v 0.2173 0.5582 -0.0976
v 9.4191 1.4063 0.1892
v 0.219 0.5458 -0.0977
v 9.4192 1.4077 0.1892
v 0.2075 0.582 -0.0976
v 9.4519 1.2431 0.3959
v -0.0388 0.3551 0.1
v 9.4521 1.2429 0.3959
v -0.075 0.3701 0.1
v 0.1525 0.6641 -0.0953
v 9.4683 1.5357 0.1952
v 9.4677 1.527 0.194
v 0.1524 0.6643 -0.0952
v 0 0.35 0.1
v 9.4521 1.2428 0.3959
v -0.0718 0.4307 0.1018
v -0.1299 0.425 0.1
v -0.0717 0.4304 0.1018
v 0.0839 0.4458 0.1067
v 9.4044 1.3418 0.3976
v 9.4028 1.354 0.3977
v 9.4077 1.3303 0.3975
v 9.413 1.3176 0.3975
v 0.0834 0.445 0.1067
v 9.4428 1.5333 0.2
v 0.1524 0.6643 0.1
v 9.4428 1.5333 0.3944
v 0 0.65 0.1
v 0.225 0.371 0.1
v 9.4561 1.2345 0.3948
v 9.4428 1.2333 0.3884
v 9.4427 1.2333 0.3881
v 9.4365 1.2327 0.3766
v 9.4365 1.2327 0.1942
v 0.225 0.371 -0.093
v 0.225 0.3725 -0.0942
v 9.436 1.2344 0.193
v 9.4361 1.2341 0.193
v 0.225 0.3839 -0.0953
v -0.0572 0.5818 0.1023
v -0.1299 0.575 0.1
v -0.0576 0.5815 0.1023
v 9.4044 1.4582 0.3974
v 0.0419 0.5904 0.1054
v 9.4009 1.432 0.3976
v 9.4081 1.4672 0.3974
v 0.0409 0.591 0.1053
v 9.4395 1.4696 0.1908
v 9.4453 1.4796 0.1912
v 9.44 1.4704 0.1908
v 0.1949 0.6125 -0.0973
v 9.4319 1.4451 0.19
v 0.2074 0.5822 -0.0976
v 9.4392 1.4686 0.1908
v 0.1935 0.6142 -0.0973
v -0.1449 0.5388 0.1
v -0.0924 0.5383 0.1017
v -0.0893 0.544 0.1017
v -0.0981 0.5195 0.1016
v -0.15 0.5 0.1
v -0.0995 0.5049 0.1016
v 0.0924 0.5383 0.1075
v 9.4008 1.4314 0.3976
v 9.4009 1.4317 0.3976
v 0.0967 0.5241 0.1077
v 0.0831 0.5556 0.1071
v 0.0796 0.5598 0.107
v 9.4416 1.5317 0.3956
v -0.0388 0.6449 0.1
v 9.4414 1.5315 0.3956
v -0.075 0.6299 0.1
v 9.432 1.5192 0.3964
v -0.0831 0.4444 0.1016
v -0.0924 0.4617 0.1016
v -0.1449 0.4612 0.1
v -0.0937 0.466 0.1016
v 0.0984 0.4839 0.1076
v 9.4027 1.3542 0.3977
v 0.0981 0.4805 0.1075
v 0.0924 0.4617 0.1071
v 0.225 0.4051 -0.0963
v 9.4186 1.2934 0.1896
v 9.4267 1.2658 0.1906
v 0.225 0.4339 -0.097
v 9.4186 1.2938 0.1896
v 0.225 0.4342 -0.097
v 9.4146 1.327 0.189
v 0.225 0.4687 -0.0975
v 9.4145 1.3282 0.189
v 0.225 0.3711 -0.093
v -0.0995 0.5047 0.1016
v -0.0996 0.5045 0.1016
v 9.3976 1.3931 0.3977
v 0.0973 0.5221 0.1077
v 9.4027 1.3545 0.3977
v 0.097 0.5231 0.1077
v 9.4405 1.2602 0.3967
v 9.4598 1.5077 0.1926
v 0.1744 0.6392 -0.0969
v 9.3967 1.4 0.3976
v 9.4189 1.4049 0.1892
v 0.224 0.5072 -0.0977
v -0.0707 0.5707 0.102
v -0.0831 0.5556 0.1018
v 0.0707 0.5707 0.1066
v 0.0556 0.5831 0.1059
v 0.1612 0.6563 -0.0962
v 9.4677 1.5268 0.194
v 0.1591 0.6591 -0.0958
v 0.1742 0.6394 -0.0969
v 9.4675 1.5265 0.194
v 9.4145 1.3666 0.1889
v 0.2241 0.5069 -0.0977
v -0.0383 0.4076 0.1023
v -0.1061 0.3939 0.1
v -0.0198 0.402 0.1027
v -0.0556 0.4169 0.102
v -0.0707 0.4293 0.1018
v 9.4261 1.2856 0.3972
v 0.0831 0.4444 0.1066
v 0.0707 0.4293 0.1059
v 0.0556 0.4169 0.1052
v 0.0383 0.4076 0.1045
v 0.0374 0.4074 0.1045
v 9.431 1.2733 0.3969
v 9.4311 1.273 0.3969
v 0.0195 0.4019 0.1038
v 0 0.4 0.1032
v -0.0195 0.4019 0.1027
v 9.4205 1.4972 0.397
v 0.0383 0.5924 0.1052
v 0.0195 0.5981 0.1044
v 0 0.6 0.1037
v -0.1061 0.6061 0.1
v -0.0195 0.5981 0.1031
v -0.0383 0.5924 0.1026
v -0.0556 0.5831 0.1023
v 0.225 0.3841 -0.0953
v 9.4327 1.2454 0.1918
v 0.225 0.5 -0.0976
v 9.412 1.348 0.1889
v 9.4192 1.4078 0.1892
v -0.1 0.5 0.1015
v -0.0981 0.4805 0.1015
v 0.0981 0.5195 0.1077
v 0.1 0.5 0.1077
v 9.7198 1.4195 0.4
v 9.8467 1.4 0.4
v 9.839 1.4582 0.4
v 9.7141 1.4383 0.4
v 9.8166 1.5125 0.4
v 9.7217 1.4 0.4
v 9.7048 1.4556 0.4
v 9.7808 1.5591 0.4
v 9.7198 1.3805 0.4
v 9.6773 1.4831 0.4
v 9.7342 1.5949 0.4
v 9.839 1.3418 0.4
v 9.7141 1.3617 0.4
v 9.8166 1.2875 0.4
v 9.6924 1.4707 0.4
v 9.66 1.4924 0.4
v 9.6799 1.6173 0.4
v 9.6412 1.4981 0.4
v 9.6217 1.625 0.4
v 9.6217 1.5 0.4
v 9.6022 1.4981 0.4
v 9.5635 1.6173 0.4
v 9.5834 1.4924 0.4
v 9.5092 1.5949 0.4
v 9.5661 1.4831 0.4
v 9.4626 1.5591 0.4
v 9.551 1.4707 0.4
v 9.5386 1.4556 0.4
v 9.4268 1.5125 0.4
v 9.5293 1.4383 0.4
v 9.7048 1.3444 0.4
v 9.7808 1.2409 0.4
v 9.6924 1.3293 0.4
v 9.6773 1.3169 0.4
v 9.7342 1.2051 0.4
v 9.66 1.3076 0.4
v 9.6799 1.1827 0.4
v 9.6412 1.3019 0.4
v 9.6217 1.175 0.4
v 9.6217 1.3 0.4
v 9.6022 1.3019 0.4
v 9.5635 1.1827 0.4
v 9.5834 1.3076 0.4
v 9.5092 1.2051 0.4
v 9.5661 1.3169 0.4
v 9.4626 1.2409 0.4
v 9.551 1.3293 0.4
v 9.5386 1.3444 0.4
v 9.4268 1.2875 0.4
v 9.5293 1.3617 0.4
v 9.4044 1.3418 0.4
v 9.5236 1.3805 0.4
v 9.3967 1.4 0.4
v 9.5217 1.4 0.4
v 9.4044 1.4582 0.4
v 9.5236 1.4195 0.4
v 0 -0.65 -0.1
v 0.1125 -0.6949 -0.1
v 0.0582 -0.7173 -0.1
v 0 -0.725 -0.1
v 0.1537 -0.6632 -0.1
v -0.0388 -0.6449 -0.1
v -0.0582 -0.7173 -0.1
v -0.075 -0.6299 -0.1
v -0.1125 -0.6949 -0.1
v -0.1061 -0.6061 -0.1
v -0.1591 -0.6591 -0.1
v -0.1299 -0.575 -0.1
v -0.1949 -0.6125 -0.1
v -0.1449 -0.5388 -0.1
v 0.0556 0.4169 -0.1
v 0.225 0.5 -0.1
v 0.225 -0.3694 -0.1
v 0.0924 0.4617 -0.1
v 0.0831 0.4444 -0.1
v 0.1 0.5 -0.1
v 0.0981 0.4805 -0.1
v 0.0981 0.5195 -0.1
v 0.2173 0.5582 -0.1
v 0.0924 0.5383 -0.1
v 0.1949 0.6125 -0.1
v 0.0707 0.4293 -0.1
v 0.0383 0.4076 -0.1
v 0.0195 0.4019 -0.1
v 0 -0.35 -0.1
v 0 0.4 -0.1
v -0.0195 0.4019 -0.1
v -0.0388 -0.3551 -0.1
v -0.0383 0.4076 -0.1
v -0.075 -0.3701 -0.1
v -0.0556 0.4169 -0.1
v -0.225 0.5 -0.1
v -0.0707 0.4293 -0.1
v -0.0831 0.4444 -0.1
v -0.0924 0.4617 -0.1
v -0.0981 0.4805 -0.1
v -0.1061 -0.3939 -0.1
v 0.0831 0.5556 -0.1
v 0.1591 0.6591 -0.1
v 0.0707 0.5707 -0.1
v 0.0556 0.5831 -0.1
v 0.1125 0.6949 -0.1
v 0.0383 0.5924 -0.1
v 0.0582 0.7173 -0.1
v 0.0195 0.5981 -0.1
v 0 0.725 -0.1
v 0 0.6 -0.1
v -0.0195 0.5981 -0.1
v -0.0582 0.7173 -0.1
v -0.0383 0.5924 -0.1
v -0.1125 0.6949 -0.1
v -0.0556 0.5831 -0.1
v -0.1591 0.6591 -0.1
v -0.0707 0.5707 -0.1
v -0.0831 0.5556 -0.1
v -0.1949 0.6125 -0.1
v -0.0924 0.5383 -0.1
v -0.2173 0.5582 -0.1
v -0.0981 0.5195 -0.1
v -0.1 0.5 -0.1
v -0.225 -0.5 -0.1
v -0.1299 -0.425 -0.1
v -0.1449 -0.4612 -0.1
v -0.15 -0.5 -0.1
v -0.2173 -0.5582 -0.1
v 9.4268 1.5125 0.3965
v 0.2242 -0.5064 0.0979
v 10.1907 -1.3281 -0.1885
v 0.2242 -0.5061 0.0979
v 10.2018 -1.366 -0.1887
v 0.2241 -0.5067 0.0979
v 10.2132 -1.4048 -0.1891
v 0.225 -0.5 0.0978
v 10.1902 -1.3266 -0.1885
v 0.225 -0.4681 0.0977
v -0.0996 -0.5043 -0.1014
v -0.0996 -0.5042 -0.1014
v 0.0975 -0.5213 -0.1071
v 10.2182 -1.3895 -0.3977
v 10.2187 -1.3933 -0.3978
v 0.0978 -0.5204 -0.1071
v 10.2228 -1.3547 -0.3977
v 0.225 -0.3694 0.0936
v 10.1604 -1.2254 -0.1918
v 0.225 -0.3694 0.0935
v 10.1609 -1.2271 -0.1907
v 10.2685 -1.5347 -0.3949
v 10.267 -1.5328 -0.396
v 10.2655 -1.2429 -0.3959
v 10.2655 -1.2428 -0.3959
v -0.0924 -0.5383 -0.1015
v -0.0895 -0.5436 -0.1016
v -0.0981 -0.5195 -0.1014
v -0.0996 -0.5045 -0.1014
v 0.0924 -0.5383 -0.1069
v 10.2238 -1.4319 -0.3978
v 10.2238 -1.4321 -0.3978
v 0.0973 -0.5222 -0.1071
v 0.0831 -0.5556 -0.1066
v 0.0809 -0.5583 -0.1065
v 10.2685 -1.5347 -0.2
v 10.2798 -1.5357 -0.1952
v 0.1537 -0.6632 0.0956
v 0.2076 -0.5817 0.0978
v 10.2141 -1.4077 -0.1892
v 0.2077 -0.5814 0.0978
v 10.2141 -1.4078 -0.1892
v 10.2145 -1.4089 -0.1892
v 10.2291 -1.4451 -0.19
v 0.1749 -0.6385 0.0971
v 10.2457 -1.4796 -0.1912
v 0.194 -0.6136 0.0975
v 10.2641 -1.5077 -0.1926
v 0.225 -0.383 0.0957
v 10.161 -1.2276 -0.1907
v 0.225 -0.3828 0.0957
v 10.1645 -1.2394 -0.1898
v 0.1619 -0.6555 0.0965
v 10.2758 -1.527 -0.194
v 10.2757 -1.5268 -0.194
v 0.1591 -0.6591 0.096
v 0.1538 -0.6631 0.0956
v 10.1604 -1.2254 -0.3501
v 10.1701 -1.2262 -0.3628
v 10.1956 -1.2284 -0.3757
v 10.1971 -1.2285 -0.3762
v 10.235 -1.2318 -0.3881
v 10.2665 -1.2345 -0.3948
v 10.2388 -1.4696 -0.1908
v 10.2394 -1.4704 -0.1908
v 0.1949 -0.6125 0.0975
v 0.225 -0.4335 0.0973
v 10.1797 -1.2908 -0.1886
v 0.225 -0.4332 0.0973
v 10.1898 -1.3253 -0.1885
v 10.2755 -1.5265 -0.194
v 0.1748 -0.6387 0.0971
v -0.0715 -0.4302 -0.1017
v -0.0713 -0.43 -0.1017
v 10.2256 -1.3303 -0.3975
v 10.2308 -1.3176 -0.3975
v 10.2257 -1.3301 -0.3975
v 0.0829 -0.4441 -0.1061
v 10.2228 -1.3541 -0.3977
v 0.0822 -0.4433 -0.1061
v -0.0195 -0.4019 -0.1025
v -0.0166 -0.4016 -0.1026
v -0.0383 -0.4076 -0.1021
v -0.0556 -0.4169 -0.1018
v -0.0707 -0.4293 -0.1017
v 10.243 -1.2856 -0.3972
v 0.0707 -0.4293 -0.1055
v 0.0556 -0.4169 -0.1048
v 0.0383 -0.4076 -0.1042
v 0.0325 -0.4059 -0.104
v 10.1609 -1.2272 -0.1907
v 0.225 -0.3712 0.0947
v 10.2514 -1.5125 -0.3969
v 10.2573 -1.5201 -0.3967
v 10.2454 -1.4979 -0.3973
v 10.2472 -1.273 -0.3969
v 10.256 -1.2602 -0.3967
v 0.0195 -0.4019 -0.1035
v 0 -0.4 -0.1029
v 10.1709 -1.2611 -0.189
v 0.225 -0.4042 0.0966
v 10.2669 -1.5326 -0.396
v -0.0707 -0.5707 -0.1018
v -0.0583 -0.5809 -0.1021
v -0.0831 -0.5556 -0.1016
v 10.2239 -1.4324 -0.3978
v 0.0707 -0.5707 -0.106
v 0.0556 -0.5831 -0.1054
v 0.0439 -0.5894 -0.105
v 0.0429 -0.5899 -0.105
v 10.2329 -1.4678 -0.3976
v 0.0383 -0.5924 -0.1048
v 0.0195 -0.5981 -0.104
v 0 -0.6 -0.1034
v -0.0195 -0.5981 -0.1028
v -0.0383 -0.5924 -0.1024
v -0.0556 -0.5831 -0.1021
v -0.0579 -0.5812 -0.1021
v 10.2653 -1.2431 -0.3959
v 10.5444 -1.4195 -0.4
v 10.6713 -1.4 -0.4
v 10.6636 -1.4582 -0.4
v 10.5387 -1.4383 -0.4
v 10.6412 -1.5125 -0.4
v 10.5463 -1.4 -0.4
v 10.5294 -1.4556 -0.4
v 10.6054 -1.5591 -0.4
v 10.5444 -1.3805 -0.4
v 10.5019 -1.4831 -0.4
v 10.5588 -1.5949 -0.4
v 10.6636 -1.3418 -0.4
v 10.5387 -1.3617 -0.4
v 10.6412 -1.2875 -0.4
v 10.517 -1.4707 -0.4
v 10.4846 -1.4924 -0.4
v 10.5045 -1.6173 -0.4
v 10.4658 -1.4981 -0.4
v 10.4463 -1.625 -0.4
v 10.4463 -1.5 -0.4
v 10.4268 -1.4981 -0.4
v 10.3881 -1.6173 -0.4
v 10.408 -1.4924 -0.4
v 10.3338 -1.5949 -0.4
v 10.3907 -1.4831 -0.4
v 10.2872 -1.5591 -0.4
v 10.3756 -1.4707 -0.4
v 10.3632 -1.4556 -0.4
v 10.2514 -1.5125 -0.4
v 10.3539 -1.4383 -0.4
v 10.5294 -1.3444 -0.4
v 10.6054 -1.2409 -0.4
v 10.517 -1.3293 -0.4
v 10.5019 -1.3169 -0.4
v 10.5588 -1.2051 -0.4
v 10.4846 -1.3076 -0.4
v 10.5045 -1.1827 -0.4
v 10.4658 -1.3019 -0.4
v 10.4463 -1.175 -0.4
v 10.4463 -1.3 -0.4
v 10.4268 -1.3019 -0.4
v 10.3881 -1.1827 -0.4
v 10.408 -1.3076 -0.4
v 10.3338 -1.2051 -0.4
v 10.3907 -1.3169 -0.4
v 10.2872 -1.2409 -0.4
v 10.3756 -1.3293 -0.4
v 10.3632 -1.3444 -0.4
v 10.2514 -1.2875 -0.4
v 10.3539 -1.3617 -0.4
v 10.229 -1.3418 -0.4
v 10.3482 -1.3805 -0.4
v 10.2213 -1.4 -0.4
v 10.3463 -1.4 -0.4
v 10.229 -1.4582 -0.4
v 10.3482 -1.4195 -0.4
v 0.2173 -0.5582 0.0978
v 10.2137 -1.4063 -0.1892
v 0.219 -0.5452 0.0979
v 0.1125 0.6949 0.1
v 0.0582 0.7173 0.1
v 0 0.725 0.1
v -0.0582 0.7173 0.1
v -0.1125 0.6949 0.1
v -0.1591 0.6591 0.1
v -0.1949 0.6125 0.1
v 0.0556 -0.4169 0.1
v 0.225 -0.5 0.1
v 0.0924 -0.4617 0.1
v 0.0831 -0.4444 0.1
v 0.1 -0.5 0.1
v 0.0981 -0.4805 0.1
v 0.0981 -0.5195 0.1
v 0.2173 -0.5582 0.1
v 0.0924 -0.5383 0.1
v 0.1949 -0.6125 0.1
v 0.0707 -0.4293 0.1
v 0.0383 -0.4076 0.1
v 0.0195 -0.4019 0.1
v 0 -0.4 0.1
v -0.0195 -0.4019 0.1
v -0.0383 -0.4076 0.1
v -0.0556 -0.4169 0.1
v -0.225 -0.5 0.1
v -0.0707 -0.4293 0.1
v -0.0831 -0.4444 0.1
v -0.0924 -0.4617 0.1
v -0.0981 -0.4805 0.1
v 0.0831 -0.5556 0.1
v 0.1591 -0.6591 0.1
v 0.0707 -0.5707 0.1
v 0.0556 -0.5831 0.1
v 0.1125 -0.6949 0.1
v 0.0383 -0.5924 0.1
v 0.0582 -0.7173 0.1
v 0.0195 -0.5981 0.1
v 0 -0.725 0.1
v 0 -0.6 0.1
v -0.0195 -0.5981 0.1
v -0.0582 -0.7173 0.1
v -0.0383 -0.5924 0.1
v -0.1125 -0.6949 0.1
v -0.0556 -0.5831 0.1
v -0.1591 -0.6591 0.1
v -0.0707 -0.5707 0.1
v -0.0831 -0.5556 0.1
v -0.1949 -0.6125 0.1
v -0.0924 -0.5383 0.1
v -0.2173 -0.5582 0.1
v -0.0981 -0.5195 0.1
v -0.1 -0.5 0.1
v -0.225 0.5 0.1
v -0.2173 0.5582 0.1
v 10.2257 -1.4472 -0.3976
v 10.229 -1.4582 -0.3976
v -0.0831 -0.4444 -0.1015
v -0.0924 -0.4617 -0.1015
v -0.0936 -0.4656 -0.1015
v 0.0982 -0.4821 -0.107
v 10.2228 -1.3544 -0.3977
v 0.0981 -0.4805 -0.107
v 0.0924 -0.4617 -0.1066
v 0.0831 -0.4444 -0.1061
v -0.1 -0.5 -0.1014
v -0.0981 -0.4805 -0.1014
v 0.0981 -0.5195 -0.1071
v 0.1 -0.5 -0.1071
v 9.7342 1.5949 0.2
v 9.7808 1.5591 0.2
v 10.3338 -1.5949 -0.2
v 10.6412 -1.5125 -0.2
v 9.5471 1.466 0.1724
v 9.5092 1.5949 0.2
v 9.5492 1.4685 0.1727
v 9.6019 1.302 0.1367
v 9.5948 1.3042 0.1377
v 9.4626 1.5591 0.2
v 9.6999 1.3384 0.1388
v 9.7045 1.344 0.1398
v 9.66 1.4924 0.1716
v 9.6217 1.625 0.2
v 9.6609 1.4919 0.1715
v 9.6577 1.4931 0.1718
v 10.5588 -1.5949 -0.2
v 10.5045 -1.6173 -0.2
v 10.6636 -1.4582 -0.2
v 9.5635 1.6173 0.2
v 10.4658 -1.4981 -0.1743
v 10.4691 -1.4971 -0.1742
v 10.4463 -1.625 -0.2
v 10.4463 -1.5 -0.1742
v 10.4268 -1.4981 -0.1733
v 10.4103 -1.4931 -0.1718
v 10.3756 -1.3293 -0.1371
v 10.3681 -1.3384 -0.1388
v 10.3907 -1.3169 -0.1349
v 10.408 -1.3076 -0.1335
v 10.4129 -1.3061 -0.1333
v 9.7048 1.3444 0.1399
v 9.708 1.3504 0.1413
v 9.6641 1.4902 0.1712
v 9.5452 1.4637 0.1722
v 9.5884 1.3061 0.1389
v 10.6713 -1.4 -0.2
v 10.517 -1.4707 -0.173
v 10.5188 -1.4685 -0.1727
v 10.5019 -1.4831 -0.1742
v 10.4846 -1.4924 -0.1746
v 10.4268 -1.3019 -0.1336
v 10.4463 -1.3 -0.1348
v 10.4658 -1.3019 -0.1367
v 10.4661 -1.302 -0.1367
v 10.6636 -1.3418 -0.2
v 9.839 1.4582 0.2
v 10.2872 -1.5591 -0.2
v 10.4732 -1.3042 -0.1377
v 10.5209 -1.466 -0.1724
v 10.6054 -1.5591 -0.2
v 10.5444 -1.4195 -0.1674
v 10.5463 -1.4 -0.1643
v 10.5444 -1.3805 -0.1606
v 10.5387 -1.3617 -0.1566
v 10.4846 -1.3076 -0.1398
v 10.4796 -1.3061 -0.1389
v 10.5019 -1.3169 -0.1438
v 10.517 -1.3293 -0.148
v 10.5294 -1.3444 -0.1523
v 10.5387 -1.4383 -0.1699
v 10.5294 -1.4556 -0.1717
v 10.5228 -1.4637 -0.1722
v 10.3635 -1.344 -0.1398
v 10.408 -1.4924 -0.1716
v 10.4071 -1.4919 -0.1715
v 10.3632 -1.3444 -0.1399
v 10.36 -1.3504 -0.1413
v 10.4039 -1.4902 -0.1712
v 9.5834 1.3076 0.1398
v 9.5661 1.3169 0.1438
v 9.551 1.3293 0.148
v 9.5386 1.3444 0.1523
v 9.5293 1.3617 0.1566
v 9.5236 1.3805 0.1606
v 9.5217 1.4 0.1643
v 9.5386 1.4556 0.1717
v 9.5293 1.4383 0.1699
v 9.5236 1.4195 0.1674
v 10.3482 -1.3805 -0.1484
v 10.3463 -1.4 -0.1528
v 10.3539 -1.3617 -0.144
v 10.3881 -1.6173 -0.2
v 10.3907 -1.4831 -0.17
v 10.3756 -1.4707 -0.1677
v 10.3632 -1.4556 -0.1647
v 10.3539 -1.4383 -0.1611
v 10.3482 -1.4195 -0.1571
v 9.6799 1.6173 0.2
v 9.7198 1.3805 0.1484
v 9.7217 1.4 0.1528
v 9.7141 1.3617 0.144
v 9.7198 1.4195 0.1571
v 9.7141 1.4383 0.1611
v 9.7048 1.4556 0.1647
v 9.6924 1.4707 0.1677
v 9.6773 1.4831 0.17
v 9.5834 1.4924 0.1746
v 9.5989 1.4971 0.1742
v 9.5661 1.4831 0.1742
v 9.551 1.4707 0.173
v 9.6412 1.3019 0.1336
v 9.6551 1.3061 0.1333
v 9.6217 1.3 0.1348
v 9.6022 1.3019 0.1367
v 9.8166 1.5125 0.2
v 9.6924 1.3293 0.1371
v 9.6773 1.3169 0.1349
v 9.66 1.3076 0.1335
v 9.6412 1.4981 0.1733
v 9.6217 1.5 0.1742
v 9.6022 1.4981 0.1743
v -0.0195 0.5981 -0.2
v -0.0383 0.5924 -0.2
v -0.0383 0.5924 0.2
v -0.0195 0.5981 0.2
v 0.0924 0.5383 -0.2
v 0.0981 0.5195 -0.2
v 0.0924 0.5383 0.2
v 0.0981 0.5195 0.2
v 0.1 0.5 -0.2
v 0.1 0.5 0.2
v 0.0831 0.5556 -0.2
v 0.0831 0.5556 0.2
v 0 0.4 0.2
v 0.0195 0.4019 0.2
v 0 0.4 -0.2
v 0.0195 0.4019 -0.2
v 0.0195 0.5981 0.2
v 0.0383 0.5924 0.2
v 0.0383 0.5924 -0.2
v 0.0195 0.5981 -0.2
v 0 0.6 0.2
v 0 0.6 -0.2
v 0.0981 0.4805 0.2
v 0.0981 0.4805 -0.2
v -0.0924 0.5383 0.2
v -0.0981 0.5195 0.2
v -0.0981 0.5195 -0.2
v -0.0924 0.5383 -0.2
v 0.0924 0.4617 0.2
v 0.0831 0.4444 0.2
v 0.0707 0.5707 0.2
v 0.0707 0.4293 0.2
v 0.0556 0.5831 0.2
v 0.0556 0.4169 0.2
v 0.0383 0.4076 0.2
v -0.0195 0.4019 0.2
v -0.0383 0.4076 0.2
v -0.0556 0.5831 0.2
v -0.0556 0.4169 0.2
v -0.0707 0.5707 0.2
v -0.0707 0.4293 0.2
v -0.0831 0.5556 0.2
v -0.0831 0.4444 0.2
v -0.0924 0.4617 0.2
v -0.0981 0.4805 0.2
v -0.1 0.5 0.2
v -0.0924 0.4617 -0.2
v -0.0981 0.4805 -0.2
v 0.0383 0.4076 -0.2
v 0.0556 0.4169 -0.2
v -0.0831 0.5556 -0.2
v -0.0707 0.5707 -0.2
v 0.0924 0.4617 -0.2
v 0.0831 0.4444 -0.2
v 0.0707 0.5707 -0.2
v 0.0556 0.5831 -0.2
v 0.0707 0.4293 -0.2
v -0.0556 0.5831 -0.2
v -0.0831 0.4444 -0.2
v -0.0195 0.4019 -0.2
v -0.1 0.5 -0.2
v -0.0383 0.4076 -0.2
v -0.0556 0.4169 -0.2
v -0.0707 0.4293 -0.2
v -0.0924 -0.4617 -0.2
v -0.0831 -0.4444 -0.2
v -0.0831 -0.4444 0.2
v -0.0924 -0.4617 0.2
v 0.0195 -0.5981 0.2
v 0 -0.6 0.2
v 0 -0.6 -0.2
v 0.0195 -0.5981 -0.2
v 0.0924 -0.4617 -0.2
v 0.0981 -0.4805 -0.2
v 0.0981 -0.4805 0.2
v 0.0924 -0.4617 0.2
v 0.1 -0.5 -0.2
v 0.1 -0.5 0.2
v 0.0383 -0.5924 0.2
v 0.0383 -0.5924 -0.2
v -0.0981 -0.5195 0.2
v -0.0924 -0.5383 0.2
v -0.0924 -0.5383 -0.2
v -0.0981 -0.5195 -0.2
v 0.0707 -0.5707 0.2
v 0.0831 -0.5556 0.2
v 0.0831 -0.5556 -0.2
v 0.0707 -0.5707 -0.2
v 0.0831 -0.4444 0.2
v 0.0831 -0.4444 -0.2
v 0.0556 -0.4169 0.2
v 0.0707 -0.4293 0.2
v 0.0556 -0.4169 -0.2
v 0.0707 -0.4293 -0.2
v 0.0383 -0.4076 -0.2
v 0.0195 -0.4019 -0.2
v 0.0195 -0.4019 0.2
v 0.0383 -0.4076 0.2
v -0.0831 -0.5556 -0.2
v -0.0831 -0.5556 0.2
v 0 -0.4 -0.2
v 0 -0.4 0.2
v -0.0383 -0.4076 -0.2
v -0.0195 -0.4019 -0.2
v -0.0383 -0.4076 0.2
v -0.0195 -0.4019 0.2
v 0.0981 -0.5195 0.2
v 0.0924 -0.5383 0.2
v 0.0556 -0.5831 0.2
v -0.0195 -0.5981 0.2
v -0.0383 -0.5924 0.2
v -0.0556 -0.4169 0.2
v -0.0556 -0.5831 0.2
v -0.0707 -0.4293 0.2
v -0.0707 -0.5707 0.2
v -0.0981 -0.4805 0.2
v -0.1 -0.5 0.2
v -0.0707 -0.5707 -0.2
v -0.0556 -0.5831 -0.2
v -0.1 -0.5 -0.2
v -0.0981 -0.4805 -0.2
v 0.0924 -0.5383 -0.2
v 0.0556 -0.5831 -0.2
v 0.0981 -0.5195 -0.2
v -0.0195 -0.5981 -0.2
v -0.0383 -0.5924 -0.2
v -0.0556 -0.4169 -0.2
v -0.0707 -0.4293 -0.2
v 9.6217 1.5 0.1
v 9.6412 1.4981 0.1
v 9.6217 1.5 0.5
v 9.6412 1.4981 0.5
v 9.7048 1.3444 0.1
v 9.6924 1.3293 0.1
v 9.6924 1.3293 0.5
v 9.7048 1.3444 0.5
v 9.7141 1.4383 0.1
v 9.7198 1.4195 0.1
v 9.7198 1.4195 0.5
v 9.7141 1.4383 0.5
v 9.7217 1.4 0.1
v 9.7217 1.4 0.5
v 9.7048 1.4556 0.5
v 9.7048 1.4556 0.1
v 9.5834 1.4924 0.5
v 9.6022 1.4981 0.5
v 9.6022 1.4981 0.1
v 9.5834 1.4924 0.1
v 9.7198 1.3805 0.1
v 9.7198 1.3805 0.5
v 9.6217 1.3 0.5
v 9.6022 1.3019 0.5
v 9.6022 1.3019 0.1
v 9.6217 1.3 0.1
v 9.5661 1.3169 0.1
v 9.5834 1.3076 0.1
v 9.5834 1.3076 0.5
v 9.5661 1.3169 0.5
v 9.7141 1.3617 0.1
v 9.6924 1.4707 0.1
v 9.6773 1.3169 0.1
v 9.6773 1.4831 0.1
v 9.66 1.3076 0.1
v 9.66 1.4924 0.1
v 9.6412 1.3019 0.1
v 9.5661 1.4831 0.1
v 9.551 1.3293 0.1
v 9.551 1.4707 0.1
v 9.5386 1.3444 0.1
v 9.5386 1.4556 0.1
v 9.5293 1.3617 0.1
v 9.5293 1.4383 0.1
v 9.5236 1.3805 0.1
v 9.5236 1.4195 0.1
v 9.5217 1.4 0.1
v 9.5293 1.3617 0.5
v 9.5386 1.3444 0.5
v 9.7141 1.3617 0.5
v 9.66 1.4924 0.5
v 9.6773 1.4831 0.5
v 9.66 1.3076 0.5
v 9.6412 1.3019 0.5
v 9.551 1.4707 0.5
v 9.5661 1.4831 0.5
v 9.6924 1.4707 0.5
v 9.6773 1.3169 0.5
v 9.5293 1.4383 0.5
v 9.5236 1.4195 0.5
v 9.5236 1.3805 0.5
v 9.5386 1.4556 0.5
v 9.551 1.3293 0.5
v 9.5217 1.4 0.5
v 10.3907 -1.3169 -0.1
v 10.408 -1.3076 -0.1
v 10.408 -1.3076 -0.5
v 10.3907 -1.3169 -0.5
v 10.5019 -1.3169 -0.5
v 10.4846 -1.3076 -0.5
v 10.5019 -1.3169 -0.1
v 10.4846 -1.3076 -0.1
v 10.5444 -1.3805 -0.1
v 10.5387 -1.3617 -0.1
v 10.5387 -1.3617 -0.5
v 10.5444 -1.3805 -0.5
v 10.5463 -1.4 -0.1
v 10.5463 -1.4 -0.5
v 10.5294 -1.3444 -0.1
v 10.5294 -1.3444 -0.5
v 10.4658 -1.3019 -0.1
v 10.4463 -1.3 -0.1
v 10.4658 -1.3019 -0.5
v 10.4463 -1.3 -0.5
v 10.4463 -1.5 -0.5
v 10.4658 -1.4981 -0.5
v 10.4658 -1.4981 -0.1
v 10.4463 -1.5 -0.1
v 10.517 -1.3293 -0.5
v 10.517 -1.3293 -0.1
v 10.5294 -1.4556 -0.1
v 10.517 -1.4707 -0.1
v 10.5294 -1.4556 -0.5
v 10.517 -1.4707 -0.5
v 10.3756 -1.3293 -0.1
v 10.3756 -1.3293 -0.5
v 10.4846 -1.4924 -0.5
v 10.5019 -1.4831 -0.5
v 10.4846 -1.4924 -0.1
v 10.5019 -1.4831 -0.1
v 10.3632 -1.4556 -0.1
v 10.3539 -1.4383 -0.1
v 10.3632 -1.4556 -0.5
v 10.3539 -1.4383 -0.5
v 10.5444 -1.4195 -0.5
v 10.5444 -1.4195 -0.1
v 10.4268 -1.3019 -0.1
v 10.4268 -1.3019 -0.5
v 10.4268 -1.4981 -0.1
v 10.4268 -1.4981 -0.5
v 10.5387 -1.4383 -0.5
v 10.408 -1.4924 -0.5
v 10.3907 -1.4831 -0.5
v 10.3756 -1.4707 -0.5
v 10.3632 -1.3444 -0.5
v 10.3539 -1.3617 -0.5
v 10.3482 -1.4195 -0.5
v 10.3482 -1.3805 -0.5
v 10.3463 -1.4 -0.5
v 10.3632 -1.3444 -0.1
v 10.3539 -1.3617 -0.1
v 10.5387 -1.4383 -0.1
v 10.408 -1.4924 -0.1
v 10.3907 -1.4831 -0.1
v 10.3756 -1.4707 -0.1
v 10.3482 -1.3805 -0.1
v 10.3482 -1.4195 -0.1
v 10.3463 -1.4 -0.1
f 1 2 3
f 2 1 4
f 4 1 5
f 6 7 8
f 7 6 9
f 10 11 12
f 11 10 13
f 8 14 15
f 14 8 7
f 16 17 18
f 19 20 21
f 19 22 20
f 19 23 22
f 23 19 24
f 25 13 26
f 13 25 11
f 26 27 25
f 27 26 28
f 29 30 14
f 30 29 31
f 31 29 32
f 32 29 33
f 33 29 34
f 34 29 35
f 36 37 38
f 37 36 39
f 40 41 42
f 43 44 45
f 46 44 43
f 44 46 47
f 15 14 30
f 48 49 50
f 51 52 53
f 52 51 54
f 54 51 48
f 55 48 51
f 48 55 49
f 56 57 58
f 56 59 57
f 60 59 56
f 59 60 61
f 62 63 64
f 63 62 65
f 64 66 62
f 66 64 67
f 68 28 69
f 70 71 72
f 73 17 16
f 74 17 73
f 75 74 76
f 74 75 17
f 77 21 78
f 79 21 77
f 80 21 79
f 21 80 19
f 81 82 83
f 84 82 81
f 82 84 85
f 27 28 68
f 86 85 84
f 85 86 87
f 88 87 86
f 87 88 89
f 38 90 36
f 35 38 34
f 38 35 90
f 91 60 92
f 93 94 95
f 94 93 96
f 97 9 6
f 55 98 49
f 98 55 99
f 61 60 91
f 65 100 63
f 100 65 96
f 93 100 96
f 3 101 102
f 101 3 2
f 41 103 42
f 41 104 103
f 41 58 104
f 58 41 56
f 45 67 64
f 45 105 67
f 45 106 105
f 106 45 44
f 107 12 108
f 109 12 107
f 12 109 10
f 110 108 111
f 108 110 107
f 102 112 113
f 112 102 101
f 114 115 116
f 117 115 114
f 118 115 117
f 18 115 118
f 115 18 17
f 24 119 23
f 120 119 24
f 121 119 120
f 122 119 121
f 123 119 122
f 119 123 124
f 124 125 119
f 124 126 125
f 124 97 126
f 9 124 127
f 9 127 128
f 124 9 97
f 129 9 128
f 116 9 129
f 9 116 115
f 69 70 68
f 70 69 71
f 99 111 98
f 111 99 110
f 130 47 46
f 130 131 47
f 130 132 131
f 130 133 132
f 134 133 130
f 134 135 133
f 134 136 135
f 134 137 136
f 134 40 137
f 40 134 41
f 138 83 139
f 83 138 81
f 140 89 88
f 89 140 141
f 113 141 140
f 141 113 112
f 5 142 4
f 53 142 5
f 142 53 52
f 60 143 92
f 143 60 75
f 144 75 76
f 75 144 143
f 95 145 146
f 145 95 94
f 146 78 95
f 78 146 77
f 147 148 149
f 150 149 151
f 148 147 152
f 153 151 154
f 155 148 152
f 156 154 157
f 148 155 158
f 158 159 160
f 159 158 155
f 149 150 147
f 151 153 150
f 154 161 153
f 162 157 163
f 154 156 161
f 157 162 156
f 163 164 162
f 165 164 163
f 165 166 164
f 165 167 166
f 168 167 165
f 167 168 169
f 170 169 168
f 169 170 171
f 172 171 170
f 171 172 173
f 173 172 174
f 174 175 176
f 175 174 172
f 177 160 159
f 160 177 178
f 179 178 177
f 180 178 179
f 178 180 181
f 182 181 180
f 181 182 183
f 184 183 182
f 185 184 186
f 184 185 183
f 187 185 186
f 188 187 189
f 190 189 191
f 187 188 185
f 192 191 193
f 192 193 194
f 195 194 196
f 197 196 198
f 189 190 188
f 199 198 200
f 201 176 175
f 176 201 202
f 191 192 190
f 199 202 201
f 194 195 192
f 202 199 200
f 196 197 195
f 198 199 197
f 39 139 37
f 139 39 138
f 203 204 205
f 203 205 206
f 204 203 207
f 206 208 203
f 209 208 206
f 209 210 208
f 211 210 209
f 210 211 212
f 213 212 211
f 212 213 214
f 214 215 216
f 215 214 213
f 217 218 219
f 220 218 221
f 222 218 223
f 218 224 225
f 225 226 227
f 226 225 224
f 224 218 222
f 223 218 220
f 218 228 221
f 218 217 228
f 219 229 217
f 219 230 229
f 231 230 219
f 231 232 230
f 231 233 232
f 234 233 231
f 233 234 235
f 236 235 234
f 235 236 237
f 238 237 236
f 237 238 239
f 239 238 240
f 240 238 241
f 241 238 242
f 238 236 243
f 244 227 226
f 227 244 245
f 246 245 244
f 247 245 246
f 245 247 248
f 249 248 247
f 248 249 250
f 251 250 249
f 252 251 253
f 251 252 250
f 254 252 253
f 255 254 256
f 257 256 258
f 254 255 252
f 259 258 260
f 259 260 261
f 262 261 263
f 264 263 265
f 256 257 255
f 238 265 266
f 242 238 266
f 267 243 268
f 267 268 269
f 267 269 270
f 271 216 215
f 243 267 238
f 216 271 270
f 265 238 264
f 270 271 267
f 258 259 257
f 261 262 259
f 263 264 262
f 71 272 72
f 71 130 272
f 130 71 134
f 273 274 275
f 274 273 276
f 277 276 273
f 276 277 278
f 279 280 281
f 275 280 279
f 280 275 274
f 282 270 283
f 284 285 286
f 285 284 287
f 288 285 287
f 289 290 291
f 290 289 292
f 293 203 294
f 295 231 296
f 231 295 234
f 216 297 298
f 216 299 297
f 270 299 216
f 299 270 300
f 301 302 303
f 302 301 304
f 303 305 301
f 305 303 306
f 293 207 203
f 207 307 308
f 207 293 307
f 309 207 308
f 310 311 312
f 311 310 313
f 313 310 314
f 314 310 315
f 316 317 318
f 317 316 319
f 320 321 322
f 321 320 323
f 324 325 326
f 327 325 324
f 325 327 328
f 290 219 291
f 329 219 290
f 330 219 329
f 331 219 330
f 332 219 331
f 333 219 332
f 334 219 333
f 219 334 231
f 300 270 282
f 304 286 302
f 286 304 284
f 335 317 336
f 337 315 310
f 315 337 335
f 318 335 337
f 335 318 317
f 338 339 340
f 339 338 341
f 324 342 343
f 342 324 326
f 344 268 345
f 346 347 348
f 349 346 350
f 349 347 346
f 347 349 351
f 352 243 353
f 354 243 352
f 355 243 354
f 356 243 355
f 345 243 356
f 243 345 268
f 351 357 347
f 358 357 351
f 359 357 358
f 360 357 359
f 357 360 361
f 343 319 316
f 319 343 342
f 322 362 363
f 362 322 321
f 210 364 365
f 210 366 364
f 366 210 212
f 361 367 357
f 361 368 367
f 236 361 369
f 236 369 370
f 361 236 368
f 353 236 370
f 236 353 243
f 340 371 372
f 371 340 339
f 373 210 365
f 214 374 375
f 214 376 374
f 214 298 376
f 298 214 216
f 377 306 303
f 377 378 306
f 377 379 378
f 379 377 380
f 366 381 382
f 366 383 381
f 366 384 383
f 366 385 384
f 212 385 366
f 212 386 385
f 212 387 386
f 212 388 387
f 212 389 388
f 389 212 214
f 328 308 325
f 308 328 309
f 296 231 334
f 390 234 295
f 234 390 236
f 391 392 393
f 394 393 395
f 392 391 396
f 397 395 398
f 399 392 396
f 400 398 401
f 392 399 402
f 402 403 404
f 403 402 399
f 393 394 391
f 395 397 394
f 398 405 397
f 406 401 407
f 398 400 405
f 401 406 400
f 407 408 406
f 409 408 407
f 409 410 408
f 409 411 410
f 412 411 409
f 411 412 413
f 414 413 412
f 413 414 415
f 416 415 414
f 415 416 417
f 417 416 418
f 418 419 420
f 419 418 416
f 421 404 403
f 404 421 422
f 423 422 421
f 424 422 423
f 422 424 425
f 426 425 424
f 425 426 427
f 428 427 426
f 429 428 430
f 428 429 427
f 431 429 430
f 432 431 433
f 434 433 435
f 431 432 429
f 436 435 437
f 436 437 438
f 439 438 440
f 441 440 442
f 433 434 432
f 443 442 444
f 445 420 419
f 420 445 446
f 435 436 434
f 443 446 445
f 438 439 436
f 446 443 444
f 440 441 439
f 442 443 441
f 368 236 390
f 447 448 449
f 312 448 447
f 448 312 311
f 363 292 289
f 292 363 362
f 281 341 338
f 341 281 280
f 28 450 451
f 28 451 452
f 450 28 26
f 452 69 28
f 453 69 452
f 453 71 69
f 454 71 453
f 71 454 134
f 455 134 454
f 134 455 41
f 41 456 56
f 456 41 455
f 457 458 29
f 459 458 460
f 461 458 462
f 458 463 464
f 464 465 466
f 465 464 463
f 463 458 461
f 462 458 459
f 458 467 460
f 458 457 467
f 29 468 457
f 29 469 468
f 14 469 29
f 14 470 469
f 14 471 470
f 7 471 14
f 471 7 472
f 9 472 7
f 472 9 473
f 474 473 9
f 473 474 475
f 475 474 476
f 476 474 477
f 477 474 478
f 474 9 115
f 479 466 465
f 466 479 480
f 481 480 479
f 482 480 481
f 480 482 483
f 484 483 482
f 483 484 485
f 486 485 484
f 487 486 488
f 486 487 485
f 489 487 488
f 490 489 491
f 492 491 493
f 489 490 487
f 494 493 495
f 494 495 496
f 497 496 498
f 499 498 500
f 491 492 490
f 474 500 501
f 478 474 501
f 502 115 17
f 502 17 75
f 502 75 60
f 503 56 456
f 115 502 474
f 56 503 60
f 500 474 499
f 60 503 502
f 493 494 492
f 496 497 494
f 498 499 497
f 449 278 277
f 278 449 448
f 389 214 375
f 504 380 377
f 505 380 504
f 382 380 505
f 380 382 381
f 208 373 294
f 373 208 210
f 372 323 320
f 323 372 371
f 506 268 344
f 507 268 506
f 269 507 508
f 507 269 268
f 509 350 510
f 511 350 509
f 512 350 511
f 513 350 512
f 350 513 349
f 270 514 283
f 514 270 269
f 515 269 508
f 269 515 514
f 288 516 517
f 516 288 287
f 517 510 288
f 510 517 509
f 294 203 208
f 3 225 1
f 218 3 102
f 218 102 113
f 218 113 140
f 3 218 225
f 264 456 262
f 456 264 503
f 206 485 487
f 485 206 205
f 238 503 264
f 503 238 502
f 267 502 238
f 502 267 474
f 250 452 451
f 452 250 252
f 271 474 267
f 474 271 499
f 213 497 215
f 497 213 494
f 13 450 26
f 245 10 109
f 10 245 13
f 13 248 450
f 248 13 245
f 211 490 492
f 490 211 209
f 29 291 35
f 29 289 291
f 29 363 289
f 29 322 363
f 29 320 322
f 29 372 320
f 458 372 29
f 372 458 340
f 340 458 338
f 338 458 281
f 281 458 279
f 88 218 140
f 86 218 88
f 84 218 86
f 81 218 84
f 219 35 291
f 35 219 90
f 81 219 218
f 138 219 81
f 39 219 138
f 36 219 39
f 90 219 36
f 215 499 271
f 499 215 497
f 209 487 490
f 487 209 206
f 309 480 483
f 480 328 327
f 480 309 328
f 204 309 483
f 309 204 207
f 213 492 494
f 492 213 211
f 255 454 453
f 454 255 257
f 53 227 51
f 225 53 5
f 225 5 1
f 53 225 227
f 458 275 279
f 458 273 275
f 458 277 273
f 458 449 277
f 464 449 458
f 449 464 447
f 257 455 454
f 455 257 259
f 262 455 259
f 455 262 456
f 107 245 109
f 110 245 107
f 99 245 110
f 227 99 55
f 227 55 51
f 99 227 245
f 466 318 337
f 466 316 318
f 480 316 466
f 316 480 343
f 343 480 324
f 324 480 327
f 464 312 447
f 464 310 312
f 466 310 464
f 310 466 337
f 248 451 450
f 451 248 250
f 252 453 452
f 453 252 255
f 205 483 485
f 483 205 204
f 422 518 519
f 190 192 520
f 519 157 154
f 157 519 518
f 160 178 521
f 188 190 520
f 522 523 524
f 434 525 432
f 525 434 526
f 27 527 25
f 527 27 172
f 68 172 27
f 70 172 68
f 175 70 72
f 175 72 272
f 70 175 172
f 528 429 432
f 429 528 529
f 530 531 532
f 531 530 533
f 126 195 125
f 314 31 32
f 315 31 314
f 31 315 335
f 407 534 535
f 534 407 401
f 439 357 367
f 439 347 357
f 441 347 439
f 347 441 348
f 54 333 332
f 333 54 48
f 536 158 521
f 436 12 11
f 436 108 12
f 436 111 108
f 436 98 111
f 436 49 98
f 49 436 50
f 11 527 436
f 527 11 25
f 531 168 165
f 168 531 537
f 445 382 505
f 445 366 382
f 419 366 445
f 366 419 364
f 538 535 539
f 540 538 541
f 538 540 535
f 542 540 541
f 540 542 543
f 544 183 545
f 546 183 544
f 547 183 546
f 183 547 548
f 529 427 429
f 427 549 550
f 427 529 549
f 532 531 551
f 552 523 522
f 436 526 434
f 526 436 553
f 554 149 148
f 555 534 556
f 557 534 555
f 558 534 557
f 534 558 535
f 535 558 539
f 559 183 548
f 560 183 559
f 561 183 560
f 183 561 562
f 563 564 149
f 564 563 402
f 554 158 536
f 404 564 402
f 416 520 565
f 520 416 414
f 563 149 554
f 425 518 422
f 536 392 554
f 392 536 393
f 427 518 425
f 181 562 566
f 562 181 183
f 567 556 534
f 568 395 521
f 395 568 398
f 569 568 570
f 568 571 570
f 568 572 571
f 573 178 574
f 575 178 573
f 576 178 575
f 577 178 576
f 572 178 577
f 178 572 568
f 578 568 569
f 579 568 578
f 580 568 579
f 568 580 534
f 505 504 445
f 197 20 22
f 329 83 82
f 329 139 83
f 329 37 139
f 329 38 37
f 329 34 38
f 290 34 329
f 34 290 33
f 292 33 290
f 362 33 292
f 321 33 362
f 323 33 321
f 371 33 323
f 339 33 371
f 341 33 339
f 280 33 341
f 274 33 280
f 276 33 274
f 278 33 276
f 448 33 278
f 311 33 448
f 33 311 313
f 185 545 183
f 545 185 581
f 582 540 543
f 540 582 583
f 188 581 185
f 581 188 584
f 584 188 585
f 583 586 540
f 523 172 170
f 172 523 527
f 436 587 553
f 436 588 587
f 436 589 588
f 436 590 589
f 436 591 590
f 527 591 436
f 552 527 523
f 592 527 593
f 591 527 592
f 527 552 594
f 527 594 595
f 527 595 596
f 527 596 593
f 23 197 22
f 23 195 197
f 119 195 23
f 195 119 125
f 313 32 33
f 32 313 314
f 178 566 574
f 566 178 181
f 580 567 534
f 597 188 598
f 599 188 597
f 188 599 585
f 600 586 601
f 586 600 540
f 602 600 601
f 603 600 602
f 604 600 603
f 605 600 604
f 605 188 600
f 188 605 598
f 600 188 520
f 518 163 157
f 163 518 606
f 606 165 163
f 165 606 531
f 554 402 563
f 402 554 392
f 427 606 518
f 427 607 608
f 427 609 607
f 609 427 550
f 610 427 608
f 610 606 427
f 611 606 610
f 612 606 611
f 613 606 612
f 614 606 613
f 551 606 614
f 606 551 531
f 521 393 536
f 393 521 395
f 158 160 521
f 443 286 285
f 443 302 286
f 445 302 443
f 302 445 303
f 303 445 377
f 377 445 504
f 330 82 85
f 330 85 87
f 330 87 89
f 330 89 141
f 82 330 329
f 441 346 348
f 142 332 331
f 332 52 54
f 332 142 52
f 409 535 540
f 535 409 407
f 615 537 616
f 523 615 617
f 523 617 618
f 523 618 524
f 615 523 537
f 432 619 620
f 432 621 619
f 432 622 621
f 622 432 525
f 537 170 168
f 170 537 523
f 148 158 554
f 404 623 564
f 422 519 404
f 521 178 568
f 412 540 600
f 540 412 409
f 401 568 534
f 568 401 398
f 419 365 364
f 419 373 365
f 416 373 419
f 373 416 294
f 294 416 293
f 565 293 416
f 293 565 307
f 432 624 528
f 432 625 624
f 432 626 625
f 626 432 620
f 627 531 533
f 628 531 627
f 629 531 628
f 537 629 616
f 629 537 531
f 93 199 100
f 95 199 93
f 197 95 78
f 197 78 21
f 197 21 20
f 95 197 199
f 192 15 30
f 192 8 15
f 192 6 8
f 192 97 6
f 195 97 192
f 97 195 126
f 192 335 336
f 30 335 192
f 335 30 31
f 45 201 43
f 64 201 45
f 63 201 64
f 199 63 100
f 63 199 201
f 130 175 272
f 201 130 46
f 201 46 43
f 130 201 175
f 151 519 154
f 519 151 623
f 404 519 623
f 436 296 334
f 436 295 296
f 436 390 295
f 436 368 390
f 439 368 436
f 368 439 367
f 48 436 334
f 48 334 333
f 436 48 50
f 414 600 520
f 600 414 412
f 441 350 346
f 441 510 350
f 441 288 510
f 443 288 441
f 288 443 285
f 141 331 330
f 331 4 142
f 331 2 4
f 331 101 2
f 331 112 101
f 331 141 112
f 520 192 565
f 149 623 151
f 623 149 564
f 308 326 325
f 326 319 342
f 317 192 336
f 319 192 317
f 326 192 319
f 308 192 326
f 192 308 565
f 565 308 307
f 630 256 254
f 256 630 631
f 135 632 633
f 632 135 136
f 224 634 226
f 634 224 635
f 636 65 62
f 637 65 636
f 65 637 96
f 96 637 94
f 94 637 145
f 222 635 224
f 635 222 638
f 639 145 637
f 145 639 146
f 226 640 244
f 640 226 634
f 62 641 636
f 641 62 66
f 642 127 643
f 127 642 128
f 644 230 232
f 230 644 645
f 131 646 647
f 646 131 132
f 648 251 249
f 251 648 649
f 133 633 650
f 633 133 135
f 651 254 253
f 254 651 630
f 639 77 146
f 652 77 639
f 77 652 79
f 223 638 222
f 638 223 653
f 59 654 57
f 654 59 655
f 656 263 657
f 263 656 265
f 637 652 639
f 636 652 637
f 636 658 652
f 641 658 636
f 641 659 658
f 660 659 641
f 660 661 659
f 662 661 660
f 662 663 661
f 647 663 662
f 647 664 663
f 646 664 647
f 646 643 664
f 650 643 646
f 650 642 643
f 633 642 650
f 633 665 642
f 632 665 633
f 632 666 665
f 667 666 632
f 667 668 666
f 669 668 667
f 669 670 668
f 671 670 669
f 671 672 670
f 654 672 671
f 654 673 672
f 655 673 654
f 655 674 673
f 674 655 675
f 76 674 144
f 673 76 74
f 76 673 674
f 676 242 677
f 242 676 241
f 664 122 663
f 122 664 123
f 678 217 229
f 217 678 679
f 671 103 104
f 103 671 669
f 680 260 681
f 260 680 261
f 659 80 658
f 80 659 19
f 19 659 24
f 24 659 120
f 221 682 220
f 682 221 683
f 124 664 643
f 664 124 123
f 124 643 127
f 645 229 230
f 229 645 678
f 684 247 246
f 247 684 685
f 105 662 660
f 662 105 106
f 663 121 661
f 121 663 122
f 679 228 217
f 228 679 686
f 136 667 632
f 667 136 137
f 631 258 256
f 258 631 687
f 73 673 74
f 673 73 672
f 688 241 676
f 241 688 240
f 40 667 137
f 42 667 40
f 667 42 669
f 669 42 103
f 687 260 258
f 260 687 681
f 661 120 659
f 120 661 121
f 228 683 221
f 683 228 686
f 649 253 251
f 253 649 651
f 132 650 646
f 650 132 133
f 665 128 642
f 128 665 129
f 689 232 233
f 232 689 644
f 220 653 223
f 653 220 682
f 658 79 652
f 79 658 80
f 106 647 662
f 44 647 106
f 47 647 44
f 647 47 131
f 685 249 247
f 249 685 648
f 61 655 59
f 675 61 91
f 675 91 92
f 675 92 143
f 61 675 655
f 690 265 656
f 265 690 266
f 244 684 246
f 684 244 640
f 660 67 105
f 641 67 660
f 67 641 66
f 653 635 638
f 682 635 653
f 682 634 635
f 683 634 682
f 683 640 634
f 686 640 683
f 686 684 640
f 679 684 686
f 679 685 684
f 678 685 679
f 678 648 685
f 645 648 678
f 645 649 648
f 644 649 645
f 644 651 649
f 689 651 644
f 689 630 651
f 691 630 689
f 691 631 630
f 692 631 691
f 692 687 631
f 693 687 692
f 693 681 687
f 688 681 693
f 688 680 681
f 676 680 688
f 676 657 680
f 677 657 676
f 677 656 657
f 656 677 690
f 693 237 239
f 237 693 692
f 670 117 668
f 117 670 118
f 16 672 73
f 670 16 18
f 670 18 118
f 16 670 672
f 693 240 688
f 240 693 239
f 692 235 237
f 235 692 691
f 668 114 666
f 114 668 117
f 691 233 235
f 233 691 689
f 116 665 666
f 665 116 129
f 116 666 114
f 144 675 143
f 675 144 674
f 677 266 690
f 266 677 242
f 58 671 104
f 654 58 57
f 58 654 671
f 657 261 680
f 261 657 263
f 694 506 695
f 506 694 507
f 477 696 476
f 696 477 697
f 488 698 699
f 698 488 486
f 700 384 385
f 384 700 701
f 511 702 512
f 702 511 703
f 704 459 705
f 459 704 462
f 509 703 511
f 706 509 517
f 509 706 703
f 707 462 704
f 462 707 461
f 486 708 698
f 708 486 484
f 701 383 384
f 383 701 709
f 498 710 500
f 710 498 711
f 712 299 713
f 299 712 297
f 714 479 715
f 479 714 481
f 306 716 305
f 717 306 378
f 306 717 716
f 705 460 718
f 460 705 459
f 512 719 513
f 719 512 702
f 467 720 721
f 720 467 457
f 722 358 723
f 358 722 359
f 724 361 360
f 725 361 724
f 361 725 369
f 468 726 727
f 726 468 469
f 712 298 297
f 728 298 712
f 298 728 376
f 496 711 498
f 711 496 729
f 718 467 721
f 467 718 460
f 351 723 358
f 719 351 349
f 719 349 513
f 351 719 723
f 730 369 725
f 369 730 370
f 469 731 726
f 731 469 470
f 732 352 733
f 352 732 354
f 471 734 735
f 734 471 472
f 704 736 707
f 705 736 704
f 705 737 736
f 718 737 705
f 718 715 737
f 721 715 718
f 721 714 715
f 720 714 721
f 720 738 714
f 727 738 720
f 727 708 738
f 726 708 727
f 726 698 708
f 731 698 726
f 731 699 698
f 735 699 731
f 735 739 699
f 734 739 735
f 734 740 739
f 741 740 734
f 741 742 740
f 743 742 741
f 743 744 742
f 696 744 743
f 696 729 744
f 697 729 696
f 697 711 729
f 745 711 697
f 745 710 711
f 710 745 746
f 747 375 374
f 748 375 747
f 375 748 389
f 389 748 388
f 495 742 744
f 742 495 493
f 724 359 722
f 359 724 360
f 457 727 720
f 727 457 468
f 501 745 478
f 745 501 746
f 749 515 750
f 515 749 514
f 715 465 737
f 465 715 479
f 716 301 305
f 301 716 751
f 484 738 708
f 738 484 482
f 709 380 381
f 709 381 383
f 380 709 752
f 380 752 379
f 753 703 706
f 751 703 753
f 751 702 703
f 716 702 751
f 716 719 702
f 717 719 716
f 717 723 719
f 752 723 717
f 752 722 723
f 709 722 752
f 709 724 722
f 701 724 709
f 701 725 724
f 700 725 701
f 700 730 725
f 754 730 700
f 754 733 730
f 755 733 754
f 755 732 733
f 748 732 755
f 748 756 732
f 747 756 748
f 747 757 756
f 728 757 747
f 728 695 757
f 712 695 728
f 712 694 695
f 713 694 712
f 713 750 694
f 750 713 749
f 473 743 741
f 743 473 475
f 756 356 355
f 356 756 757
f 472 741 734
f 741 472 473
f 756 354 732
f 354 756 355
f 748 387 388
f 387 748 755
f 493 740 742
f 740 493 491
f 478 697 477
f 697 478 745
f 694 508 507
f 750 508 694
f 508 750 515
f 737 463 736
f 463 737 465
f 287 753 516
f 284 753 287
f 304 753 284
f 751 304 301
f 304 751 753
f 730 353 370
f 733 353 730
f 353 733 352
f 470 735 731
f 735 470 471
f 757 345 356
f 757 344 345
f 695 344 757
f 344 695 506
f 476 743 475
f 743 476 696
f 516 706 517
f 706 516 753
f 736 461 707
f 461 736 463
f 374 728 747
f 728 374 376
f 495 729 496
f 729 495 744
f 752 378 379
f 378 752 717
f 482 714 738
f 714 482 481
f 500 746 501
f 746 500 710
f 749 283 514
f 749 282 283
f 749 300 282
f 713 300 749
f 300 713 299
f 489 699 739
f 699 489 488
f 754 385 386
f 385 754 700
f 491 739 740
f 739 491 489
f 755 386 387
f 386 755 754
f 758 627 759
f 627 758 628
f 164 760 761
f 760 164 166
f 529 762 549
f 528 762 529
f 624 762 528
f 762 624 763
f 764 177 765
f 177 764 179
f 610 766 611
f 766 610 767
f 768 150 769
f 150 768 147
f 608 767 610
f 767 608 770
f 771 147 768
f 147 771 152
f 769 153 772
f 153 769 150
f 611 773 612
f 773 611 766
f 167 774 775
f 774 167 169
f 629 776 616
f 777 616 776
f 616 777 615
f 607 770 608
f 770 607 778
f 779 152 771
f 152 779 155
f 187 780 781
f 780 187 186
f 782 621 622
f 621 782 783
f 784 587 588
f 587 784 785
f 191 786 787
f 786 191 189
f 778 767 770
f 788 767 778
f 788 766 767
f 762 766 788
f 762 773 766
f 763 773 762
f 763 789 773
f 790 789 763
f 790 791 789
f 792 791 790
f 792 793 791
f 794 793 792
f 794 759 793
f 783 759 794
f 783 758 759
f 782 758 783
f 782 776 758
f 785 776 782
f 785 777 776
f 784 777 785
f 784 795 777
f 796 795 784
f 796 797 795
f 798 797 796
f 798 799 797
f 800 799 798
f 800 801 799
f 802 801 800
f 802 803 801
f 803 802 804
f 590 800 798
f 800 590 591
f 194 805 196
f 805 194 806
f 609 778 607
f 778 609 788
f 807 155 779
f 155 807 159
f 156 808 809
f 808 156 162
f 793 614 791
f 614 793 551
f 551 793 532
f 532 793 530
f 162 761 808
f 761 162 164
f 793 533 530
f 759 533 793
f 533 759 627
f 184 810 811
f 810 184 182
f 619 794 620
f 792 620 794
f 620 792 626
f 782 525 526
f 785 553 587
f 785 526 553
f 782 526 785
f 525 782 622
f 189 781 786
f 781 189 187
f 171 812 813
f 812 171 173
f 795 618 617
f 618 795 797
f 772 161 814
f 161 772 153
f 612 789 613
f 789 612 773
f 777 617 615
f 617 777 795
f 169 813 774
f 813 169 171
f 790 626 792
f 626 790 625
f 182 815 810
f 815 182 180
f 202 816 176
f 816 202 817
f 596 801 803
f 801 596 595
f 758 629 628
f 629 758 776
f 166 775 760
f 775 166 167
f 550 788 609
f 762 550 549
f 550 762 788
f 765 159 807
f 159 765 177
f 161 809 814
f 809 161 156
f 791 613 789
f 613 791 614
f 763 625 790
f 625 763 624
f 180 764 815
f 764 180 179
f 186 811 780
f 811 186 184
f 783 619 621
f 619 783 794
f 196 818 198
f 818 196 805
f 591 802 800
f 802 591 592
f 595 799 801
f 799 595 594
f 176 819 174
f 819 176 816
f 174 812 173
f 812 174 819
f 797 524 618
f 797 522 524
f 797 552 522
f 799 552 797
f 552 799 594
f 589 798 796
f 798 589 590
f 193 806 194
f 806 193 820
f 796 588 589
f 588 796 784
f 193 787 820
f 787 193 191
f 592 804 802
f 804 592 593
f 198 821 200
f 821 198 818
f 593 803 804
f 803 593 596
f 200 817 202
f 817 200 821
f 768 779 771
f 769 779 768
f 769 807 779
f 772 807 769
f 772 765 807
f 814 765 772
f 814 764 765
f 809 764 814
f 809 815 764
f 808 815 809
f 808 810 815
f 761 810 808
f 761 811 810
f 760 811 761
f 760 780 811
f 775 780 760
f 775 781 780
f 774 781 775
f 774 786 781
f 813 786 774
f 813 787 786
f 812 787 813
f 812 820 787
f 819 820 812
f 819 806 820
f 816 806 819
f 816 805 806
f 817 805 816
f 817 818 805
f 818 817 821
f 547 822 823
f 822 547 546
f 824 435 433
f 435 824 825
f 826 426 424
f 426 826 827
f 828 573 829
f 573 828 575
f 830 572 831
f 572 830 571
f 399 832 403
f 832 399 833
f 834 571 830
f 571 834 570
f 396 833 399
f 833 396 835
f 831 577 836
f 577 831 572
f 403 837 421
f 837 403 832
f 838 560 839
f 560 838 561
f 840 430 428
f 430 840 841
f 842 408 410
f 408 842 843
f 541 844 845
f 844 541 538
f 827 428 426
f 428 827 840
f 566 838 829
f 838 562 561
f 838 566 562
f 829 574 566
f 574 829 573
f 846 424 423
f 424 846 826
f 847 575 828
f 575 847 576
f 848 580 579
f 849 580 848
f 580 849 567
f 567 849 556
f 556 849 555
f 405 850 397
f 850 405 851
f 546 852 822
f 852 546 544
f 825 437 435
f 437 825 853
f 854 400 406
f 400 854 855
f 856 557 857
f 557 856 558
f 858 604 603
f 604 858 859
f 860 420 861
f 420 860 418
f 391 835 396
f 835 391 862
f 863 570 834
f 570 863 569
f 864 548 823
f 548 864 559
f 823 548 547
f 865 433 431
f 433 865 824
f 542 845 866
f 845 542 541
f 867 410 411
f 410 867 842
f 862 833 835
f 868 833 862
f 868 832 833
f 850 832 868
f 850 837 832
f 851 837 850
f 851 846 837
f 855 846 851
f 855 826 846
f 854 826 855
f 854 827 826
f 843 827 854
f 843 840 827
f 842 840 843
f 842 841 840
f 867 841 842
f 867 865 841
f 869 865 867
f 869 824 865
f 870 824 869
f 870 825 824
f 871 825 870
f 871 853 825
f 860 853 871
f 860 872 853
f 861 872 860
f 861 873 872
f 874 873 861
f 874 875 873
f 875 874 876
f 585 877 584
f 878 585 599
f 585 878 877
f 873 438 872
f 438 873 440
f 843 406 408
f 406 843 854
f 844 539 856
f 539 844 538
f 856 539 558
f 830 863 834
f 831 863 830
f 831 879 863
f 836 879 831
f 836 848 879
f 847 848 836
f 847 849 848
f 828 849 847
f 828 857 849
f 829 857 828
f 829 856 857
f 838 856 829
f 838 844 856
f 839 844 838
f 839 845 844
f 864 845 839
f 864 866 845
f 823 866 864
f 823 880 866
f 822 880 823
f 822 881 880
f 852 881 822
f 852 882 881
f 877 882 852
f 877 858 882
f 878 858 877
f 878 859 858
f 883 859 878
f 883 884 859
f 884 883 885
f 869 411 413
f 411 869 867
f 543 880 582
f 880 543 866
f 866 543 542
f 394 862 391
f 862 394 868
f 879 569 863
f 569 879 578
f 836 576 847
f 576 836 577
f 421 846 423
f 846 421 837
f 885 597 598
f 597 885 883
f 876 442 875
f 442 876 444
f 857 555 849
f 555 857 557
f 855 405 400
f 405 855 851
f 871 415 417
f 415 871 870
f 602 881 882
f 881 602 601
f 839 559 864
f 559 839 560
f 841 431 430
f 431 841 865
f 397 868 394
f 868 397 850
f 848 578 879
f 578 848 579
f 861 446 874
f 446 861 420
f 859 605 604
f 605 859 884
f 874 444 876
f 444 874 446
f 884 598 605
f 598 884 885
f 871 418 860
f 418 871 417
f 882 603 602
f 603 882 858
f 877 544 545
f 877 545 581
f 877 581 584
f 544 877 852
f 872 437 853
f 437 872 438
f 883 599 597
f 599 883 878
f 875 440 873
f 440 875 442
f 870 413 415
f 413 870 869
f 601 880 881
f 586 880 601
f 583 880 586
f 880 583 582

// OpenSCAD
// X-Finger reconstruction — KIN-ID v1.3 normalized primary-stage skeleton
// NOT manufacturing geometry. Units are normalized by AB.

AB = 1.0000;
AC = 9.6217;
BD = 10.4463;
CD = 2.1357;

pivot_d = 0.20;
bar_w = 0.30;
bar_t = 0.20;

// Simple review-only skeleton. Exact included angle is not frozen here.
A=[0, AB/2, 0];
B=[0,-AB/2, 0];
C=[AC, 1.4, 0.3];
D=[BD,-1.4,-0.3];

module pivot(p){
  translate(p) cylinder(h=bar_t*2,d=pivot_d,center=true,$fn=32);
}

module bar(p0,p1,w=bar_w,t=bar_t){
  hull(){
    translate(p0) cylinder(h=t,d=w,center=true,$fn=24);
    translate(p1) cylinder(h=t,d=w,center=true,$fn=24);
  }
}

bar(A,C);
bar(B,D);
bar(A,B,w=0.45);
bar(C,D,w=0.45);
pivot(A); pivot(B); pivot(C); pivot(D);
